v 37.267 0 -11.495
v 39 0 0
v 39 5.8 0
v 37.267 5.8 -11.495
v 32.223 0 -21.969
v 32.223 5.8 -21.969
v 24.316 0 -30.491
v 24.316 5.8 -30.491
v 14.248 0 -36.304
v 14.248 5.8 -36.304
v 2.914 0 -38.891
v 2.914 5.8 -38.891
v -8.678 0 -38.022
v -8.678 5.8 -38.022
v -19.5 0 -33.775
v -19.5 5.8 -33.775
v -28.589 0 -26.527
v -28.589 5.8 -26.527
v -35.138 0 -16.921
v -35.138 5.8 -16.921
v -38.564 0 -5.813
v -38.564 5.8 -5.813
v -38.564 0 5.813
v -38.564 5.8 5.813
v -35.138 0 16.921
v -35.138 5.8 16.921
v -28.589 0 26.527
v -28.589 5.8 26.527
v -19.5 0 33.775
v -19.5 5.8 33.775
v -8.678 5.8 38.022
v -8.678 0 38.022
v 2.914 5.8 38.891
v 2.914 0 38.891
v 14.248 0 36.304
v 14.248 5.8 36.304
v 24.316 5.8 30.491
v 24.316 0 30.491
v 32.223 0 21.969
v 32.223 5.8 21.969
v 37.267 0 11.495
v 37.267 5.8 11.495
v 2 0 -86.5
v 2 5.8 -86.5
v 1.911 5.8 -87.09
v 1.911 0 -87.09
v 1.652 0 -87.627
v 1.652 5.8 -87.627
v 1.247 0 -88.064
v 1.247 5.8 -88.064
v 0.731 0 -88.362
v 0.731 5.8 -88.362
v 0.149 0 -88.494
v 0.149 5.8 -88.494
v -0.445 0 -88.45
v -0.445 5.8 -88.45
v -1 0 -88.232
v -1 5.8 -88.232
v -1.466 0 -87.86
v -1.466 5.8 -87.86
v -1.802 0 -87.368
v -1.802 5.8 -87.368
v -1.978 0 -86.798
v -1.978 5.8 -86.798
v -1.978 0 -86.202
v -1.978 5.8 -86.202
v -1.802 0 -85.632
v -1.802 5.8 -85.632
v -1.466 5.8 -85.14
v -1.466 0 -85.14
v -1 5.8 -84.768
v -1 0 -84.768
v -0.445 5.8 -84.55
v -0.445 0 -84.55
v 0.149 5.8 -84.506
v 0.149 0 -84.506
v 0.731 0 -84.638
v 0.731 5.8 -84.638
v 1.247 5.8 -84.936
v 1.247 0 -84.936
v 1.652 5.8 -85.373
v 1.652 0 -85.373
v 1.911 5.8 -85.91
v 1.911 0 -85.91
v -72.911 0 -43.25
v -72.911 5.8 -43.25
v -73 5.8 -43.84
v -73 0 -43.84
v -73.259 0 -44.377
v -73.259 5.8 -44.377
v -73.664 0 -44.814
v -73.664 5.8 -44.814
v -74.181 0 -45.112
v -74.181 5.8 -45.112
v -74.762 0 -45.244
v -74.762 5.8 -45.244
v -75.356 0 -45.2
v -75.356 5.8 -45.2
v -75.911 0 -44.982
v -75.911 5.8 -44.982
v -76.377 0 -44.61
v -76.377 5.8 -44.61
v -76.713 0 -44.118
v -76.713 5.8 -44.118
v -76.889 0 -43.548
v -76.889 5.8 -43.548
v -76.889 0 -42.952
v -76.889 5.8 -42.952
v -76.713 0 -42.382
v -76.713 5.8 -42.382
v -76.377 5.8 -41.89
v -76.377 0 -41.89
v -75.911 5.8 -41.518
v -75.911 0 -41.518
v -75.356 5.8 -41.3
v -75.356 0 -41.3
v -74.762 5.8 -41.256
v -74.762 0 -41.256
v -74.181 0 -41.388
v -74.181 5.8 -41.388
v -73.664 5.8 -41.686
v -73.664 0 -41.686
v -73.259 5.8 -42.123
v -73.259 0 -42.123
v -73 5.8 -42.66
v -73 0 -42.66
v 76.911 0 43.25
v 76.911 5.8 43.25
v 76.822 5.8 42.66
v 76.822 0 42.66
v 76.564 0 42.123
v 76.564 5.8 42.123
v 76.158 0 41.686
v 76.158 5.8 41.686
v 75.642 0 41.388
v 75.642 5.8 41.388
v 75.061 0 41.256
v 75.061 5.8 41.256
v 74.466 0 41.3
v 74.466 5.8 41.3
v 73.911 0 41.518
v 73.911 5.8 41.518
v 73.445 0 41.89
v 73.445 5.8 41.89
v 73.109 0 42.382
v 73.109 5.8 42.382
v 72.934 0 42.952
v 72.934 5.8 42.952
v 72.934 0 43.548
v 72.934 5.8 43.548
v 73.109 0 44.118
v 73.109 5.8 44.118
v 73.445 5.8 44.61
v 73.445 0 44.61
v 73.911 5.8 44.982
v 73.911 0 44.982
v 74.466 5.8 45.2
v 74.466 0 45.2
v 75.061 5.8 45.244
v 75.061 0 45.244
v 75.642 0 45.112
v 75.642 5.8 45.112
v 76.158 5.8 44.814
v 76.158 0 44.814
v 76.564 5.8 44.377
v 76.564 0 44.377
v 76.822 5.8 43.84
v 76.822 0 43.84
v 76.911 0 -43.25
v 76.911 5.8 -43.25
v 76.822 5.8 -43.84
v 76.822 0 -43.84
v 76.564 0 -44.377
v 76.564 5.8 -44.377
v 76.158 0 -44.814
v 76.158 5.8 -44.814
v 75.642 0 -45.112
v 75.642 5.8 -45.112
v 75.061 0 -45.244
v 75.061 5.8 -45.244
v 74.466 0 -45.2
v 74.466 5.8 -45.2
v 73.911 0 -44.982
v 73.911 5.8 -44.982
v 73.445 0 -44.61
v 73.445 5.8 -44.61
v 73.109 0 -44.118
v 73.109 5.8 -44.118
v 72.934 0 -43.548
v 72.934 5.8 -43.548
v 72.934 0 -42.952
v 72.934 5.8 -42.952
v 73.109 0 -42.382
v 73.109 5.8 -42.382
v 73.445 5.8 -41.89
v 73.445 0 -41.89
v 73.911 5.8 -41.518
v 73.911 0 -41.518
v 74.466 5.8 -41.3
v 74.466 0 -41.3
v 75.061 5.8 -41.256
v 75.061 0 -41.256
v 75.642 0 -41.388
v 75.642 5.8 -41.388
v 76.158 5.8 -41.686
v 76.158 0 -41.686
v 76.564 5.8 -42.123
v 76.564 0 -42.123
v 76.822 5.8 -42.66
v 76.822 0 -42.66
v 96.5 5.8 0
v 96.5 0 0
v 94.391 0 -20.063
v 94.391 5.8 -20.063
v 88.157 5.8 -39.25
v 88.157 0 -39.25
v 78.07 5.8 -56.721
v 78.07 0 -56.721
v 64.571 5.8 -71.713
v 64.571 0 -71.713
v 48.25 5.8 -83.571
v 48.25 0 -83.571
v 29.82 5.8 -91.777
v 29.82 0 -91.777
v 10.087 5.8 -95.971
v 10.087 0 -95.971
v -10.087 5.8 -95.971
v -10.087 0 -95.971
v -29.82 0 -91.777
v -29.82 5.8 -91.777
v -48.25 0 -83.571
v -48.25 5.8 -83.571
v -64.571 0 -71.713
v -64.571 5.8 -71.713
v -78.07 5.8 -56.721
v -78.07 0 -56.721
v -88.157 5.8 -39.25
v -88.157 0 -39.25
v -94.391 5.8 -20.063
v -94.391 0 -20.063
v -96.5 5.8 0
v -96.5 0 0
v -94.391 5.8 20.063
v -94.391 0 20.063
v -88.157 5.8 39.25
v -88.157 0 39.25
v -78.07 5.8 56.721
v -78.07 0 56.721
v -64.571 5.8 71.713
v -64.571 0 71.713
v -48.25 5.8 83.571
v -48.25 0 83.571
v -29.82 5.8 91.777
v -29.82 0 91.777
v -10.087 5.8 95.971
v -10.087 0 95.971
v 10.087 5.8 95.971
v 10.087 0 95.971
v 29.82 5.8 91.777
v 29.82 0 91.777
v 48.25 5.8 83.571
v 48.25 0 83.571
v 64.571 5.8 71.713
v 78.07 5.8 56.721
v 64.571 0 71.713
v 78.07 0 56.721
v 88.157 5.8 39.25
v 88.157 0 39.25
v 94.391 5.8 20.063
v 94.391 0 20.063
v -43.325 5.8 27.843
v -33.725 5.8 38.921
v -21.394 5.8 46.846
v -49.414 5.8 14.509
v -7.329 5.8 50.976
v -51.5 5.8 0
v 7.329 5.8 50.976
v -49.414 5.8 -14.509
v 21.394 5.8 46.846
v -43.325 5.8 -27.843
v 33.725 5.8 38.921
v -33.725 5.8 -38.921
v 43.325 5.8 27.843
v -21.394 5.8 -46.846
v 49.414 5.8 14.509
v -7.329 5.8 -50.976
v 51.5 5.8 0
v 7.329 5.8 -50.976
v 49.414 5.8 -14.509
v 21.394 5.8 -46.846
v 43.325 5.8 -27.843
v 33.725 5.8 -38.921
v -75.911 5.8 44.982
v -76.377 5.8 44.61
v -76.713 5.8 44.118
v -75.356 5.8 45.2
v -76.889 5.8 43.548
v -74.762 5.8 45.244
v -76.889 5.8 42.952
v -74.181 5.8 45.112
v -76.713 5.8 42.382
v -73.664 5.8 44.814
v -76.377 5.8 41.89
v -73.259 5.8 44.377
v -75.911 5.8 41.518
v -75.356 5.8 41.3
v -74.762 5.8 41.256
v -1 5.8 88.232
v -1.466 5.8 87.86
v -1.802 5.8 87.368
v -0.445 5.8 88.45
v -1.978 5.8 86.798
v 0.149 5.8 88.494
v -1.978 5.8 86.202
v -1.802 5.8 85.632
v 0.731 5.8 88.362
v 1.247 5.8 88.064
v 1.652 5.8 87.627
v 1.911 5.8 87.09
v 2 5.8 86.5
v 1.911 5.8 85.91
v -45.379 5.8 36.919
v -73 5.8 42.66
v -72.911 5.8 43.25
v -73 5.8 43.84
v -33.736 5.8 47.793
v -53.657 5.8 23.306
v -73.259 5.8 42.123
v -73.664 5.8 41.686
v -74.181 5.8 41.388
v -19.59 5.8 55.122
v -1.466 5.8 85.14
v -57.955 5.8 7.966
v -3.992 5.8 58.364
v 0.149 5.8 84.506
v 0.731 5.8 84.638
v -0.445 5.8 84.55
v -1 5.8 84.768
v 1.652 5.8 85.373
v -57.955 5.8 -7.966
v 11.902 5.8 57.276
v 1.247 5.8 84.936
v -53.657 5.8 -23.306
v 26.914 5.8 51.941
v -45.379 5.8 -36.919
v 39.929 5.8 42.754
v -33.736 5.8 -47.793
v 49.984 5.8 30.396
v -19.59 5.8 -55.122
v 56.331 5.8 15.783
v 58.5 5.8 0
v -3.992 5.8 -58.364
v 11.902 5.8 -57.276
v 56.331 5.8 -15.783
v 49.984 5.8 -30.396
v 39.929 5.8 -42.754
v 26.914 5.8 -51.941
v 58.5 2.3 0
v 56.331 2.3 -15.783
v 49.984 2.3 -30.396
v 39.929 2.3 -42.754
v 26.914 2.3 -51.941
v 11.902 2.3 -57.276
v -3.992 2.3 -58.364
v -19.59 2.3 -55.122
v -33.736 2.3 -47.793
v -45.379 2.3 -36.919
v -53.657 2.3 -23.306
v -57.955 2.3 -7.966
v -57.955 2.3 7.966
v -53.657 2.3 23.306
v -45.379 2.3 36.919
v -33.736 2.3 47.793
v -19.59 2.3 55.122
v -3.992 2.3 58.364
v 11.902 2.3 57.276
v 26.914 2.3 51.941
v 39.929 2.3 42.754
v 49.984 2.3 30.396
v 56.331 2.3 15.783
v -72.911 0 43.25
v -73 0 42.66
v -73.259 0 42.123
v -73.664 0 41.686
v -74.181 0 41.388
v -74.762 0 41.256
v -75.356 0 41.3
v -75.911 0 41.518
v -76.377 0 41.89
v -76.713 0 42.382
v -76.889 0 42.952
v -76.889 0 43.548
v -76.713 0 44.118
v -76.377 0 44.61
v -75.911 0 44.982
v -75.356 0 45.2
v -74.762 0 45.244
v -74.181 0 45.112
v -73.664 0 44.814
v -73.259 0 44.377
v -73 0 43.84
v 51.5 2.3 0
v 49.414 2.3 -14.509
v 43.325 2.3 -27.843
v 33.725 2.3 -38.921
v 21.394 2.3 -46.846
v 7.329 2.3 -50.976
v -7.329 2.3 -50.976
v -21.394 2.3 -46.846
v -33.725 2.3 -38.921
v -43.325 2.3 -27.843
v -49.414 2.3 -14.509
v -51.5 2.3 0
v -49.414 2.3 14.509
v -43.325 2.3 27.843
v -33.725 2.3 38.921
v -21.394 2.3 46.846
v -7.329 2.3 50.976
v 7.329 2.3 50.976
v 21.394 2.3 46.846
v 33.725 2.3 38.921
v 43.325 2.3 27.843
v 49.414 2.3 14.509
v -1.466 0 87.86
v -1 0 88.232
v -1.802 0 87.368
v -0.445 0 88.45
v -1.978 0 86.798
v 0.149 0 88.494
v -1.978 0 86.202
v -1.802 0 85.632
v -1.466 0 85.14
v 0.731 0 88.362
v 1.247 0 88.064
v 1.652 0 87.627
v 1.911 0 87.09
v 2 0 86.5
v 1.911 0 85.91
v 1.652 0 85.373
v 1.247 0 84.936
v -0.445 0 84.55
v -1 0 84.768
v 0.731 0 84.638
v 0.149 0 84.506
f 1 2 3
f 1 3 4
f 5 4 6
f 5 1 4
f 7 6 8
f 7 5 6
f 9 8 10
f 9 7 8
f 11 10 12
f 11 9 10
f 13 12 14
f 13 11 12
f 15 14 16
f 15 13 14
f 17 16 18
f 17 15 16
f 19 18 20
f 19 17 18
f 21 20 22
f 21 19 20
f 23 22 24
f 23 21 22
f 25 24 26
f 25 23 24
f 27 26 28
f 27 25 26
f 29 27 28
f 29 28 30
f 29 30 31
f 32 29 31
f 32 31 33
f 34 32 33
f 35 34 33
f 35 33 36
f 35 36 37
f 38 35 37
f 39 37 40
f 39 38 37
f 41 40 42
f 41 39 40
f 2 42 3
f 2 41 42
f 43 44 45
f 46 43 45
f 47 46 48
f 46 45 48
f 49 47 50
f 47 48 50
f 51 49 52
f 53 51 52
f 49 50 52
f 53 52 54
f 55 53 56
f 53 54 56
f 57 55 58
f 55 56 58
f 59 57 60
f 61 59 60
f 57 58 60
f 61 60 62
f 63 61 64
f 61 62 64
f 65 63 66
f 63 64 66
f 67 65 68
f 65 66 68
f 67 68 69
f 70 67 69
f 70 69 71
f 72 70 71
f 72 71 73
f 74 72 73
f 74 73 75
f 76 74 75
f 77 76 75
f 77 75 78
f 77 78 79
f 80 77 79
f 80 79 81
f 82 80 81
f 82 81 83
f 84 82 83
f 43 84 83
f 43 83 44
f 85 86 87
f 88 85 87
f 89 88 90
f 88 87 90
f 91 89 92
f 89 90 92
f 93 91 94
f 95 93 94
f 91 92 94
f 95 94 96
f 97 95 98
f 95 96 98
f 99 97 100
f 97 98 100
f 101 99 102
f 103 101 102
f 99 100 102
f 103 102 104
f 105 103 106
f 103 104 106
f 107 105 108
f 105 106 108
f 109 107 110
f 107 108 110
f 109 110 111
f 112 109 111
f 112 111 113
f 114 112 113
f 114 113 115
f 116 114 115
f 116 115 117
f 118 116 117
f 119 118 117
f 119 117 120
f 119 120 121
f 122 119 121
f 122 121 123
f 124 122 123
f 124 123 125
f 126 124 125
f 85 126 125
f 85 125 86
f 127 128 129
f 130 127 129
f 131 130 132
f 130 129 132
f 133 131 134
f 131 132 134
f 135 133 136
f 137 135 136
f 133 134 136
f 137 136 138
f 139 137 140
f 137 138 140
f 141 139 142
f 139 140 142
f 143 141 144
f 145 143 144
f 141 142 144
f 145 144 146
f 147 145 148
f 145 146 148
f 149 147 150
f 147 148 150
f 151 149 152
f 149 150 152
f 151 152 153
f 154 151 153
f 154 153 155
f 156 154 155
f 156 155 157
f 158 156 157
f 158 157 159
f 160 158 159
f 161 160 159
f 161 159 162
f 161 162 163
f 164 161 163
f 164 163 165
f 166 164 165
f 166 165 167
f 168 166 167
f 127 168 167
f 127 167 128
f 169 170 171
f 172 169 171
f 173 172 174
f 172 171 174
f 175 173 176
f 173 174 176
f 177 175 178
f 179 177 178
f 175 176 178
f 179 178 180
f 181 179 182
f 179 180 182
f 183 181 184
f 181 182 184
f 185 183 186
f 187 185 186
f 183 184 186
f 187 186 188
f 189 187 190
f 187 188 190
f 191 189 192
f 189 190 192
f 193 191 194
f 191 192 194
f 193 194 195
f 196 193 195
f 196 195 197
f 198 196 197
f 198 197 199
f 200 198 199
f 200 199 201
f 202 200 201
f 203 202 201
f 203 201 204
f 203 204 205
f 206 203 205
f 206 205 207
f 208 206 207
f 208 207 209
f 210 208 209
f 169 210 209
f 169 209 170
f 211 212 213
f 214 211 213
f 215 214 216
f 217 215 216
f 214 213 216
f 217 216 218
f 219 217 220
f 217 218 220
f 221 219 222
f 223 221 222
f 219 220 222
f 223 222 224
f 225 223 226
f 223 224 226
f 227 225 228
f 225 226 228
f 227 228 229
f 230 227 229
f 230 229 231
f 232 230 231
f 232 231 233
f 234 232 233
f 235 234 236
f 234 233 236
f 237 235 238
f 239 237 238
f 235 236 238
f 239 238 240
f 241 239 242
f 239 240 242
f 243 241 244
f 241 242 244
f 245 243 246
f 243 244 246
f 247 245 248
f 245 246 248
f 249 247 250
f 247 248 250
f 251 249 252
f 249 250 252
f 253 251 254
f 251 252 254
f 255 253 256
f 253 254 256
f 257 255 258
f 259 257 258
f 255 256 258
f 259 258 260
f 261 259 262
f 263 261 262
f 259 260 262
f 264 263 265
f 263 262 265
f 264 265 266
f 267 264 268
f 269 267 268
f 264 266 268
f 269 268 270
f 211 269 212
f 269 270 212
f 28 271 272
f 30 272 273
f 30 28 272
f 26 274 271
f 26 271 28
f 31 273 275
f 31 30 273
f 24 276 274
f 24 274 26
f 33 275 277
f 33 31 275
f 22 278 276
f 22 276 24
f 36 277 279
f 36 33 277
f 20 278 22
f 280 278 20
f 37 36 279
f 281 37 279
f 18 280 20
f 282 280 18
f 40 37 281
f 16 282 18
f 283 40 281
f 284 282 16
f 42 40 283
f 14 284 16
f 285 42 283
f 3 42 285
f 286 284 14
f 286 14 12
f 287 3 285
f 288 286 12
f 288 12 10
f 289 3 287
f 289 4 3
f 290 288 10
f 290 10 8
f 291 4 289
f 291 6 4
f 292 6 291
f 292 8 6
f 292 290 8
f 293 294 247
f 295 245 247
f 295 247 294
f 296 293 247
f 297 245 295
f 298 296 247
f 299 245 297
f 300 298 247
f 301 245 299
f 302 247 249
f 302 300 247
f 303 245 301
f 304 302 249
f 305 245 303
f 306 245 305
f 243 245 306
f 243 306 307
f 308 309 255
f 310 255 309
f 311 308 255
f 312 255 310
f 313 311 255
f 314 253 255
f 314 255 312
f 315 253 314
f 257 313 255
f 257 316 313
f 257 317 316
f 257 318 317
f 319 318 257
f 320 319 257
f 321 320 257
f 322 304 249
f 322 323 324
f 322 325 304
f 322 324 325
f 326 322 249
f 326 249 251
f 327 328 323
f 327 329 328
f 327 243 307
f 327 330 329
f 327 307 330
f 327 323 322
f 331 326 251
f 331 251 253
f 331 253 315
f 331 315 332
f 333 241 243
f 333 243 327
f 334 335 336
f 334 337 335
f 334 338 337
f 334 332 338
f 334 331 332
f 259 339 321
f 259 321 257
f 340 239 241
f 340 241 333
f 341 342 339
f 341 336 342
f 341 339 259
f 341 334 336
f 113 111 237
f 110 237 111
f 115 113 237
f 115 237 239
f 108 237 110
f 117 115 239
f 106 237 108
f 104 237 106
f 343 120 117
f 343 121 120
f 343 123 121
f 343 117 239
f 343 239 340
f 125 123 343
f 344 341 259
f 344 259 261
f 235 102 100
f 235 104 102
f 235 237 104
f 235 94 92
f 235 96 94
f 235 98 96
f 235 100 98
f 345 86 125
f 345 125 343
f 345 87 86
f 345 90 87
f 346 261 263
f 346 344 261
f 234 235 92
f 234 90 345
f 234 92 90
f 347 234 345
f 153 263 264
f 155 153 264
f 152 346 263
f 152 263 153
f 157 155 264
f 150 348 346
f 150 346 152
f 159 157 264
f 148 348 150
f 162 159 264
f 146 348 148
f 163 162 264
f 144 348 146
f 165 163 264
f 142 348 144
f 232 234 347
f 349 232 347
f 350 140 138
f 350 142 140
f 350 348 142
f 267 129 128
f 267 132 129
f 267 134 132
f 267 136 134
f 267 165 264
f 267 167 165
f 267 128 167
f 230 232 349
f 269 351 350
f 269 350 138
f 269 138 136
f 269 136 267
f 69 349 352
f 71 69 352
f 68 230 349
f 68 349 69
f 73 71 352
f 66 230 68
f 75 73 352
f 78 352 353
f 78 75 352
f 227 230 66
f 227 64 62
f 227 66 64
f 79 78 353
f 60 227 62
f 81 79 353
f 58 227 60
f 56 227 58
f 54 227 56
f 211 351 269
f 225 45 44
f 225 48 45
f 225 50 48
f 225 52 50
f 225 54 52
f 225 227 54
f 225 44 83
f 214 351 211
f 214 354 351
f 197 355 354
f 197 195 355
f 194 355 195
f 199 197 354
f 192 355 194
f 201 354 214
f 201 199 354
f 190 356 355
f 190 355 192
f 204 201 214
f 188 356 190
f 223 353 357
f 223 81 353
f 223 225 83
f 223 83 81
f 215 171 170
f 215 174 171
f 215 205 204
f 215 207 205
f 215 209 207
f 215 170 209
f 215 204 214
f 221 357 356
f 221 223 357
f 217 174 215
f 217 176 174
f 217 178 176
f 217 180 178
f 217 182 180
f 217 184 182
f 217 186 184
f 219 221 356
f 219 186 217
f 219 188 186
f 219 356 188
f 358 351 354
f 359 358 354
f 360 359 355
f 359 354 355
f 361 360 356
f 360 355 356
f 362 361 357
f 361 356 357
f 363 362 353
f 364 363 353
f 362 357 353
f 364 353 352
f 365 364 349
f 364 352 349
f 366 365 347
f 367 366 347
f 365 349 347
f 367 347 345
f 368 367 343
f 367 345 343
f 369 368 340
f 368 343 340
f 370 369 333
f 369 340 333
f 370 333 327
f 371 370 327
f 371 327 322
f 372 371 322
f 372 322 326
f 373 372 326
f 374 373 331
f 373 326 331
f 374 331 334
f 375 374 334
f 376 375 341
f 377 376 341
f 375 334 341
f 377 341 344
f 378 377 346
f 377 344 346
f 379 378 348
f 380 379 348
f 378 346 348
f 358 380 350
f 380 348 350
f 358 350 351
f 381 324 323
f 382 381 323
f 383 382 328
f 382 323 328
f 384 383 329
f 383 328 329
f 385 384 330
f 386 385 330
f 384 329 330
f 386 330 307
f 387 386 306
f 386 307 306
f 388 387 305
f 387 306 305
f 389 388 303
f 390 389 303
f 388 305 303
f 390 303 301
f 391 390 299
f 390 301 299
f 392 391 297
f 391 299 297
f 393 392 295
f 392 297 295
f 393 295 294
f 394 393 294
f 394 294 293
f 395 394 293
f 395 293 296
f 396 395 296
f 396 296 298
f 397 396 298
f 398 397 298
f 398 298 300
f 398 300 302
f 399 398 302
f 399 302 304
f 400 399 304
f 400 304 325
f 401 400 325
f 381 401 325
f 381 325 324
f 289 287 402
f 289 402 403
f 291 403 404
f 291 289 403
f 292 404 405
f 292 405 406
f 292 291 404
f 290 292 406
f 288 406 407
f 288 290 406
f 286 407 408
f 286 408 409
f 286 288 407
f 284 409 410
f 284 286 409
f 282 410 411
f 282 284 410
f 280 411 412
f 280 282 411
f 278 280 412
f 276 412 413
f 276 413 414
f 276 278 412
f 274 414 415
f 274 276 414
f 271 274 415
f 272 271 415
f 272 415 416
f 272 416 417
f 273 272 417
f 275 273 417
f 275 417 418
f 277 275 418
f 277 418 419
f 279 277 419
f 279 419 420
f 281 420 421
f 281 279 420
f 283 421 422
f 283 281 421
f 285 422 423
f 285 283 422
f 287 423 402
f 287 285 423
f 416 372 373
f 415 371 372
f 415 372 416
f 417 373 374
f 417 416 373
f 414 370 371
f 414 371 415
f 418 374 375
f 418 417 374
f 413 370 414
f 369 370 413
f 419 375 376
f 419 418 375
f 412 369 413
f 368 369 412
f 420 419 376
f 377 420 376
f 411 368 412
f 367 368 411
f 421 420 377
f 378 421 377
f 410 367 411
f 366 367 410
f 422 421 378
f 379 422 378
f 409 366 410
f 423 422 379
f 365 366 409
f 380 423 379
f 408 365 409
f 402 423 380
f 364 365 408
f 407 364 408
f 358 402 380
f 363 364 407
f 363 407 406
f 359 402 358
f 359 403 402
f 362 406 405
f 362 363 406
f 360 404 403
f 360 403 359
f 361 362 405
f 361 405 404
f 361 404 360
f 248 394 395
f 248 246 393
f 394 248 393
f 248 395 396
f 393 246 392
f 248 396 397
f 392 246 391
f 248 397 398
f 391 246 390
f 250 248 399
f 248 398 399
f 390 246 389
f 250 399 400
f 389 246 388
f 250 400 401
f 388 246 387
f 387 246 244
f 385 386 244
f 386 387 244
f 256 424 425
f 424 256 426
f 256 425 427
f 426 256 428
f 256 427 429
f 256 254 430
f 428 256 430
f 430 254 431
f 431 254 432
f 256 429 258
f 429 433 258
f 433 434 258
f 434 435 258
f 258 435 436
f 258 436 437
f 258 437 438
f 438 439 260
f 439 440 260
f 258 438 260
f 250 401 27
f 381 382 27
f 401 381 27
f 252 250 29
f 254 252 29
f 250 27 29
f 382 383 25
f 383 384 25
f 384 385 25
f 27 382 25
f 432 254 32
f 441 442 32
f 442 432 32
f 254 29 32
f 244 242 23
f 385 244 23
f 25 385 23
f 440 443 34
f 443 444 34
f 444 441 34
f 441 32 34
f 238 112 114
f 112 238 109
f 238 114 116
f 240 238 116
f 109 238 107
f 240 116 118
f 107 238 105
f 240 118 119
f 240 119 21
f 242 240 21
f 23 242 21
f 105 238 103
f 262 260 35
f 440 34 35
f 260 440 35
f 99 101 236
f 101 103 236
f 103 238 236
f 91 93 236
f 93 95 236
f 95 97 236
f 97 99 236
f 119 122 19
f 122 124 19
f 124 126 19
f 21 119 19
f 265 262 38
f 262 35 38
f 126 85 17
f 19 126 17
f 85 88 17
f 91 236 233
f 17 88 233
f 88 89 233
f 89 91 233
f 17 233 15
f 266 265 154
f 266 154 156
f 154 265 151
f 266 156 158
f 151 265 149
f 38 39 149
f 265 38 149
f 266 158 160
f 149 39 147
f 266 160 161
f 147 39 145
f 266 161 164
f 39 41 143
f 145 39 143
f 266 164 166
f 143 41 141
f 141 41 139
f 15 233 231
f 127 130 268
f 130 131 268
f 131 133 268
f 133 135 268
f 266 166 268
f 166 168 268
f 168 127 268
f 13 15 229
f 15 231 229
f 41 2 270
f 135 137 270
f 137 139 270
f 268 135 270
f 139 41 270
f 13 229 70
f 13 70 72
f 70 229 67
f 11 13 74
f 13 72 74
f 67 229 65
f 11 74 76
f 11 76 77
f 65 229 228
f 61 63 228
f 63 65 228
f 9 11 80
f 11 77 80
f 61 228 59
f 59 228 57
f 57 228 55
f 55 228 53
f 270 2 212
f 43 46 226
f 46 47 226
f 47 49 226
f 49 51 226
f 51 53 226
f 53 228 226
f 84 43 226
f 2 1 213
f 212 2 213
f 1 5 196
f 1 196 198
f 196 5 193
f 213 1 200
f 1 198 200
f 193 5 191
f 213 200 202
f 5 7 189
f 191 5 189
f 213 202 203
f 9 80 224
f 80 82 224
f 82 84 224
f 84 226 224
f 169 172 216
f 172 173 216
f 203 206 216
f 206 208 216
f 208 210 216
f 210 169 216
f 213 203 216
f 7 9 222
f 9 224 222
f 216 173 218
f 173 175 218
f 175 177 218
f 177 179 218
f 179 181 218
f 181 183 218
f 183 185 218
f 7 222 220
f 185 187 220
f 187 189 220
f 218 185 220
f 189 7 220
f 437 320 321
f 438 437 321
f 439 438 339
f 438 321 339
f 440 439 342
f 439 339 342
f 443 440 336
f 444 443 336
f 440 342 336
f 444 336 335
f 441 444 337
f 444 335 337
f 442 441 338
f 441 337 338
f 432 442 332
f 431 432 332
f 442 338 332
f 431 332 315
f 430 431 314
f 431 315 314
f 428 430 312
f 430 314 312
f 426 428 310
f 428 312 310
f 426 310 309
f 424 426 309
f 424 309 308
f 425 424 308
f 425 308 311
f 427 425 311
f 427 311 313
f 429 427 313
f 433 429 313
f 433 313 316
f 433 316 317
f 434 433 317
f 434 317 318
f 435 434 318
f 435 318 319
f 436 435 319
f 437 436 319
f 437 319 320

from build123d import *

# Parameters (mm, degrees)
SKETCH1_R           = 96.5
SKETCH1_R_2         = 39
BOSS_EXTRUDE1_DEPTH = 5.8
SKETCH2_R           = 58.5
SKETCH2_R_2         = 51.5
CUT_EXTRUDE1_DEPTH  = 3.5
SKETCH3_R           = 2
CUT_EXTRUDE2_DEPTH  = 6.8


with BuildPart() as part:
    # Sketch1 → Boss-Extrude1 (new body)
    with BuildSketch(Plane(origin=(0, 0, 0), x_dir=(1, 0, 0), z_dir=(0, 1, 0))):
        Circle(SKETCH1_R)
        Circle(SKETCH1_R_2, mode=Mode.SUBTRACT)
    extrude(amount=BOSS_EXTRUDE1_DEPTH)

    # Sketch2 → Cut-Extrude1 (cut)
    with BuildSketch(Plane(origin=(0, 5.8, 0), x_dir=(1, 0, 0), z_dir=(0, 1, 0))):
        Circle(SKETCH2_R)
        Circle(SKETCH2_R_2, mode=Mode.SUBTRACT)
    extrude(amount=-CUT_EXTRUDE1_DEPTH, mode=Mode.SUBTRACT)

    # Sketch3 → Cut-Extrude2 (cut, through all)
    with BuildSketch(Plane(origin=(0, 5.8, 0), x_dir=(1, 0, 0), z_dir=(0, 1, 0))):
        with Locations((0, 86.5)):
            Circle(SKETCH3_R)
        with Locations((74.911197427, 43.25)):
            Circle(SKETCH3_R)
        with Locations((74.911197427, -43.25)):
            Circle(SKETCH3_R)
        with Locations((0, -86.5)):
            Circle(SKETCH3_R)
        with Locations((-74.911197427, -43.25)):
            Circle(SKETCH3_R)
        with Locations((-74.911197427, 43.25)):
            Circle(SKETCH3_R)
    extrude(amount=-CUT_EXTRUDE2_DEPTH, mode=Mode.SUBTRACT)


solid = part.part
